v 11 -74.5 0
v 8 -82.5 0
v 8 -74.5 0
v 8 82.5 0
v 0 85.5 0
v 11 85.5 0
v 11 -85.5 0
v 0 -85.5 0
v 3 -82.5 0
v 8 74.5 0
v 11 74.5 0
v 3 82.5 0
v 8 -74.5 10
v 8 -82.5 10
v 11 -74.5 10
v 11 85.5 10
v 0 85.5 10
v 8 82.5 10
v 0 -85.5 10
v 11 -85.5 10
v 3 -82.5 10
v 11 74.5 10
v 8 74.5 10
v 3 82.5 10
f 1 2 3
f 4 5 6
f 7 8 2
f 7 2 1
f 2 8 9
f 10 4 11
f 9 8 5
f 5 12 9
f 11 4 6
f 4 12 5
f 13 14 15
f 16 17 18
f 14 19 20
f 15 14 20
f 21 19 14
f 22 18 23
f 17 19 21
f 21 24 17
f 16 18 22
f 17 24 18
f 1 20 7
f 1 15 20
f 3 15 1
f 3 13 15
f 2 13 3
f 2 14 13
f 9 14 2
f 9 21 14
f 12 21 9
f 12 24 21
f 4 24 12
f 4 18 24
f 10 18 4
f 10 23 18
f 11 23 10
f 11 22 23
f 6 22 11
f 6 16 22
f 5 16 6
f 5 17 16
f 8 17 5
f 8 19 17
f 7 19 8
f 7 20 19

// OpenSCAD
// thickness of the material in mm
Material_thickness = 3;
//width of your planter in mm when it is compressed
width_of_the_planter = 165;
// height of the rim in mm
height_of_the_rim = 5;
// length of the holder in mm (if you don't want that, set to 0)
length_of_the_holder = 5;
// width of the clamb in mm
width_of_the_whole_clamb = 10;
linear_extrude( height=width_of_the_whole_clamb, twist=0, scale=[1, 1], center=false){
  union(){
    mirror([0,1,0]){
      union(){
        square([Material_thickness, (width_of_the_planter / 2)], center=false);
        translate([0, (width_of_the_planter / 2), 0]){
          square([(height_of_the_rim + Material_thickness * 2), Material_thickness], center=false);
        }
        translate([(height_of_the_rim + Material_thickness), (width_of_the_planter / 2 - (length_of_the_holder + Material_thickness)), 0]){
          square([Material_thickness, (length_of_the_holder + Material_thickness)], center=false);
        }
      }
    }
    union(){
      square([Material_thickness, (width_of_the_planter / 2)], center=false);
      translate([0, (width_of_the_planter / 2), 0]){
        square([(height_of_the_rim + Material_thickness * 2), Material_thickness], center=false);
      }
      translate([(height_of_the_rim + Material_thickness), (width_of_the_planter / 2 - (length_of_the_holder + Material_thickness)), 0]){
        square([Material_thickness, (length_of_the_holder + Material_thickness)], center=false);
      }
    }
  }
}
